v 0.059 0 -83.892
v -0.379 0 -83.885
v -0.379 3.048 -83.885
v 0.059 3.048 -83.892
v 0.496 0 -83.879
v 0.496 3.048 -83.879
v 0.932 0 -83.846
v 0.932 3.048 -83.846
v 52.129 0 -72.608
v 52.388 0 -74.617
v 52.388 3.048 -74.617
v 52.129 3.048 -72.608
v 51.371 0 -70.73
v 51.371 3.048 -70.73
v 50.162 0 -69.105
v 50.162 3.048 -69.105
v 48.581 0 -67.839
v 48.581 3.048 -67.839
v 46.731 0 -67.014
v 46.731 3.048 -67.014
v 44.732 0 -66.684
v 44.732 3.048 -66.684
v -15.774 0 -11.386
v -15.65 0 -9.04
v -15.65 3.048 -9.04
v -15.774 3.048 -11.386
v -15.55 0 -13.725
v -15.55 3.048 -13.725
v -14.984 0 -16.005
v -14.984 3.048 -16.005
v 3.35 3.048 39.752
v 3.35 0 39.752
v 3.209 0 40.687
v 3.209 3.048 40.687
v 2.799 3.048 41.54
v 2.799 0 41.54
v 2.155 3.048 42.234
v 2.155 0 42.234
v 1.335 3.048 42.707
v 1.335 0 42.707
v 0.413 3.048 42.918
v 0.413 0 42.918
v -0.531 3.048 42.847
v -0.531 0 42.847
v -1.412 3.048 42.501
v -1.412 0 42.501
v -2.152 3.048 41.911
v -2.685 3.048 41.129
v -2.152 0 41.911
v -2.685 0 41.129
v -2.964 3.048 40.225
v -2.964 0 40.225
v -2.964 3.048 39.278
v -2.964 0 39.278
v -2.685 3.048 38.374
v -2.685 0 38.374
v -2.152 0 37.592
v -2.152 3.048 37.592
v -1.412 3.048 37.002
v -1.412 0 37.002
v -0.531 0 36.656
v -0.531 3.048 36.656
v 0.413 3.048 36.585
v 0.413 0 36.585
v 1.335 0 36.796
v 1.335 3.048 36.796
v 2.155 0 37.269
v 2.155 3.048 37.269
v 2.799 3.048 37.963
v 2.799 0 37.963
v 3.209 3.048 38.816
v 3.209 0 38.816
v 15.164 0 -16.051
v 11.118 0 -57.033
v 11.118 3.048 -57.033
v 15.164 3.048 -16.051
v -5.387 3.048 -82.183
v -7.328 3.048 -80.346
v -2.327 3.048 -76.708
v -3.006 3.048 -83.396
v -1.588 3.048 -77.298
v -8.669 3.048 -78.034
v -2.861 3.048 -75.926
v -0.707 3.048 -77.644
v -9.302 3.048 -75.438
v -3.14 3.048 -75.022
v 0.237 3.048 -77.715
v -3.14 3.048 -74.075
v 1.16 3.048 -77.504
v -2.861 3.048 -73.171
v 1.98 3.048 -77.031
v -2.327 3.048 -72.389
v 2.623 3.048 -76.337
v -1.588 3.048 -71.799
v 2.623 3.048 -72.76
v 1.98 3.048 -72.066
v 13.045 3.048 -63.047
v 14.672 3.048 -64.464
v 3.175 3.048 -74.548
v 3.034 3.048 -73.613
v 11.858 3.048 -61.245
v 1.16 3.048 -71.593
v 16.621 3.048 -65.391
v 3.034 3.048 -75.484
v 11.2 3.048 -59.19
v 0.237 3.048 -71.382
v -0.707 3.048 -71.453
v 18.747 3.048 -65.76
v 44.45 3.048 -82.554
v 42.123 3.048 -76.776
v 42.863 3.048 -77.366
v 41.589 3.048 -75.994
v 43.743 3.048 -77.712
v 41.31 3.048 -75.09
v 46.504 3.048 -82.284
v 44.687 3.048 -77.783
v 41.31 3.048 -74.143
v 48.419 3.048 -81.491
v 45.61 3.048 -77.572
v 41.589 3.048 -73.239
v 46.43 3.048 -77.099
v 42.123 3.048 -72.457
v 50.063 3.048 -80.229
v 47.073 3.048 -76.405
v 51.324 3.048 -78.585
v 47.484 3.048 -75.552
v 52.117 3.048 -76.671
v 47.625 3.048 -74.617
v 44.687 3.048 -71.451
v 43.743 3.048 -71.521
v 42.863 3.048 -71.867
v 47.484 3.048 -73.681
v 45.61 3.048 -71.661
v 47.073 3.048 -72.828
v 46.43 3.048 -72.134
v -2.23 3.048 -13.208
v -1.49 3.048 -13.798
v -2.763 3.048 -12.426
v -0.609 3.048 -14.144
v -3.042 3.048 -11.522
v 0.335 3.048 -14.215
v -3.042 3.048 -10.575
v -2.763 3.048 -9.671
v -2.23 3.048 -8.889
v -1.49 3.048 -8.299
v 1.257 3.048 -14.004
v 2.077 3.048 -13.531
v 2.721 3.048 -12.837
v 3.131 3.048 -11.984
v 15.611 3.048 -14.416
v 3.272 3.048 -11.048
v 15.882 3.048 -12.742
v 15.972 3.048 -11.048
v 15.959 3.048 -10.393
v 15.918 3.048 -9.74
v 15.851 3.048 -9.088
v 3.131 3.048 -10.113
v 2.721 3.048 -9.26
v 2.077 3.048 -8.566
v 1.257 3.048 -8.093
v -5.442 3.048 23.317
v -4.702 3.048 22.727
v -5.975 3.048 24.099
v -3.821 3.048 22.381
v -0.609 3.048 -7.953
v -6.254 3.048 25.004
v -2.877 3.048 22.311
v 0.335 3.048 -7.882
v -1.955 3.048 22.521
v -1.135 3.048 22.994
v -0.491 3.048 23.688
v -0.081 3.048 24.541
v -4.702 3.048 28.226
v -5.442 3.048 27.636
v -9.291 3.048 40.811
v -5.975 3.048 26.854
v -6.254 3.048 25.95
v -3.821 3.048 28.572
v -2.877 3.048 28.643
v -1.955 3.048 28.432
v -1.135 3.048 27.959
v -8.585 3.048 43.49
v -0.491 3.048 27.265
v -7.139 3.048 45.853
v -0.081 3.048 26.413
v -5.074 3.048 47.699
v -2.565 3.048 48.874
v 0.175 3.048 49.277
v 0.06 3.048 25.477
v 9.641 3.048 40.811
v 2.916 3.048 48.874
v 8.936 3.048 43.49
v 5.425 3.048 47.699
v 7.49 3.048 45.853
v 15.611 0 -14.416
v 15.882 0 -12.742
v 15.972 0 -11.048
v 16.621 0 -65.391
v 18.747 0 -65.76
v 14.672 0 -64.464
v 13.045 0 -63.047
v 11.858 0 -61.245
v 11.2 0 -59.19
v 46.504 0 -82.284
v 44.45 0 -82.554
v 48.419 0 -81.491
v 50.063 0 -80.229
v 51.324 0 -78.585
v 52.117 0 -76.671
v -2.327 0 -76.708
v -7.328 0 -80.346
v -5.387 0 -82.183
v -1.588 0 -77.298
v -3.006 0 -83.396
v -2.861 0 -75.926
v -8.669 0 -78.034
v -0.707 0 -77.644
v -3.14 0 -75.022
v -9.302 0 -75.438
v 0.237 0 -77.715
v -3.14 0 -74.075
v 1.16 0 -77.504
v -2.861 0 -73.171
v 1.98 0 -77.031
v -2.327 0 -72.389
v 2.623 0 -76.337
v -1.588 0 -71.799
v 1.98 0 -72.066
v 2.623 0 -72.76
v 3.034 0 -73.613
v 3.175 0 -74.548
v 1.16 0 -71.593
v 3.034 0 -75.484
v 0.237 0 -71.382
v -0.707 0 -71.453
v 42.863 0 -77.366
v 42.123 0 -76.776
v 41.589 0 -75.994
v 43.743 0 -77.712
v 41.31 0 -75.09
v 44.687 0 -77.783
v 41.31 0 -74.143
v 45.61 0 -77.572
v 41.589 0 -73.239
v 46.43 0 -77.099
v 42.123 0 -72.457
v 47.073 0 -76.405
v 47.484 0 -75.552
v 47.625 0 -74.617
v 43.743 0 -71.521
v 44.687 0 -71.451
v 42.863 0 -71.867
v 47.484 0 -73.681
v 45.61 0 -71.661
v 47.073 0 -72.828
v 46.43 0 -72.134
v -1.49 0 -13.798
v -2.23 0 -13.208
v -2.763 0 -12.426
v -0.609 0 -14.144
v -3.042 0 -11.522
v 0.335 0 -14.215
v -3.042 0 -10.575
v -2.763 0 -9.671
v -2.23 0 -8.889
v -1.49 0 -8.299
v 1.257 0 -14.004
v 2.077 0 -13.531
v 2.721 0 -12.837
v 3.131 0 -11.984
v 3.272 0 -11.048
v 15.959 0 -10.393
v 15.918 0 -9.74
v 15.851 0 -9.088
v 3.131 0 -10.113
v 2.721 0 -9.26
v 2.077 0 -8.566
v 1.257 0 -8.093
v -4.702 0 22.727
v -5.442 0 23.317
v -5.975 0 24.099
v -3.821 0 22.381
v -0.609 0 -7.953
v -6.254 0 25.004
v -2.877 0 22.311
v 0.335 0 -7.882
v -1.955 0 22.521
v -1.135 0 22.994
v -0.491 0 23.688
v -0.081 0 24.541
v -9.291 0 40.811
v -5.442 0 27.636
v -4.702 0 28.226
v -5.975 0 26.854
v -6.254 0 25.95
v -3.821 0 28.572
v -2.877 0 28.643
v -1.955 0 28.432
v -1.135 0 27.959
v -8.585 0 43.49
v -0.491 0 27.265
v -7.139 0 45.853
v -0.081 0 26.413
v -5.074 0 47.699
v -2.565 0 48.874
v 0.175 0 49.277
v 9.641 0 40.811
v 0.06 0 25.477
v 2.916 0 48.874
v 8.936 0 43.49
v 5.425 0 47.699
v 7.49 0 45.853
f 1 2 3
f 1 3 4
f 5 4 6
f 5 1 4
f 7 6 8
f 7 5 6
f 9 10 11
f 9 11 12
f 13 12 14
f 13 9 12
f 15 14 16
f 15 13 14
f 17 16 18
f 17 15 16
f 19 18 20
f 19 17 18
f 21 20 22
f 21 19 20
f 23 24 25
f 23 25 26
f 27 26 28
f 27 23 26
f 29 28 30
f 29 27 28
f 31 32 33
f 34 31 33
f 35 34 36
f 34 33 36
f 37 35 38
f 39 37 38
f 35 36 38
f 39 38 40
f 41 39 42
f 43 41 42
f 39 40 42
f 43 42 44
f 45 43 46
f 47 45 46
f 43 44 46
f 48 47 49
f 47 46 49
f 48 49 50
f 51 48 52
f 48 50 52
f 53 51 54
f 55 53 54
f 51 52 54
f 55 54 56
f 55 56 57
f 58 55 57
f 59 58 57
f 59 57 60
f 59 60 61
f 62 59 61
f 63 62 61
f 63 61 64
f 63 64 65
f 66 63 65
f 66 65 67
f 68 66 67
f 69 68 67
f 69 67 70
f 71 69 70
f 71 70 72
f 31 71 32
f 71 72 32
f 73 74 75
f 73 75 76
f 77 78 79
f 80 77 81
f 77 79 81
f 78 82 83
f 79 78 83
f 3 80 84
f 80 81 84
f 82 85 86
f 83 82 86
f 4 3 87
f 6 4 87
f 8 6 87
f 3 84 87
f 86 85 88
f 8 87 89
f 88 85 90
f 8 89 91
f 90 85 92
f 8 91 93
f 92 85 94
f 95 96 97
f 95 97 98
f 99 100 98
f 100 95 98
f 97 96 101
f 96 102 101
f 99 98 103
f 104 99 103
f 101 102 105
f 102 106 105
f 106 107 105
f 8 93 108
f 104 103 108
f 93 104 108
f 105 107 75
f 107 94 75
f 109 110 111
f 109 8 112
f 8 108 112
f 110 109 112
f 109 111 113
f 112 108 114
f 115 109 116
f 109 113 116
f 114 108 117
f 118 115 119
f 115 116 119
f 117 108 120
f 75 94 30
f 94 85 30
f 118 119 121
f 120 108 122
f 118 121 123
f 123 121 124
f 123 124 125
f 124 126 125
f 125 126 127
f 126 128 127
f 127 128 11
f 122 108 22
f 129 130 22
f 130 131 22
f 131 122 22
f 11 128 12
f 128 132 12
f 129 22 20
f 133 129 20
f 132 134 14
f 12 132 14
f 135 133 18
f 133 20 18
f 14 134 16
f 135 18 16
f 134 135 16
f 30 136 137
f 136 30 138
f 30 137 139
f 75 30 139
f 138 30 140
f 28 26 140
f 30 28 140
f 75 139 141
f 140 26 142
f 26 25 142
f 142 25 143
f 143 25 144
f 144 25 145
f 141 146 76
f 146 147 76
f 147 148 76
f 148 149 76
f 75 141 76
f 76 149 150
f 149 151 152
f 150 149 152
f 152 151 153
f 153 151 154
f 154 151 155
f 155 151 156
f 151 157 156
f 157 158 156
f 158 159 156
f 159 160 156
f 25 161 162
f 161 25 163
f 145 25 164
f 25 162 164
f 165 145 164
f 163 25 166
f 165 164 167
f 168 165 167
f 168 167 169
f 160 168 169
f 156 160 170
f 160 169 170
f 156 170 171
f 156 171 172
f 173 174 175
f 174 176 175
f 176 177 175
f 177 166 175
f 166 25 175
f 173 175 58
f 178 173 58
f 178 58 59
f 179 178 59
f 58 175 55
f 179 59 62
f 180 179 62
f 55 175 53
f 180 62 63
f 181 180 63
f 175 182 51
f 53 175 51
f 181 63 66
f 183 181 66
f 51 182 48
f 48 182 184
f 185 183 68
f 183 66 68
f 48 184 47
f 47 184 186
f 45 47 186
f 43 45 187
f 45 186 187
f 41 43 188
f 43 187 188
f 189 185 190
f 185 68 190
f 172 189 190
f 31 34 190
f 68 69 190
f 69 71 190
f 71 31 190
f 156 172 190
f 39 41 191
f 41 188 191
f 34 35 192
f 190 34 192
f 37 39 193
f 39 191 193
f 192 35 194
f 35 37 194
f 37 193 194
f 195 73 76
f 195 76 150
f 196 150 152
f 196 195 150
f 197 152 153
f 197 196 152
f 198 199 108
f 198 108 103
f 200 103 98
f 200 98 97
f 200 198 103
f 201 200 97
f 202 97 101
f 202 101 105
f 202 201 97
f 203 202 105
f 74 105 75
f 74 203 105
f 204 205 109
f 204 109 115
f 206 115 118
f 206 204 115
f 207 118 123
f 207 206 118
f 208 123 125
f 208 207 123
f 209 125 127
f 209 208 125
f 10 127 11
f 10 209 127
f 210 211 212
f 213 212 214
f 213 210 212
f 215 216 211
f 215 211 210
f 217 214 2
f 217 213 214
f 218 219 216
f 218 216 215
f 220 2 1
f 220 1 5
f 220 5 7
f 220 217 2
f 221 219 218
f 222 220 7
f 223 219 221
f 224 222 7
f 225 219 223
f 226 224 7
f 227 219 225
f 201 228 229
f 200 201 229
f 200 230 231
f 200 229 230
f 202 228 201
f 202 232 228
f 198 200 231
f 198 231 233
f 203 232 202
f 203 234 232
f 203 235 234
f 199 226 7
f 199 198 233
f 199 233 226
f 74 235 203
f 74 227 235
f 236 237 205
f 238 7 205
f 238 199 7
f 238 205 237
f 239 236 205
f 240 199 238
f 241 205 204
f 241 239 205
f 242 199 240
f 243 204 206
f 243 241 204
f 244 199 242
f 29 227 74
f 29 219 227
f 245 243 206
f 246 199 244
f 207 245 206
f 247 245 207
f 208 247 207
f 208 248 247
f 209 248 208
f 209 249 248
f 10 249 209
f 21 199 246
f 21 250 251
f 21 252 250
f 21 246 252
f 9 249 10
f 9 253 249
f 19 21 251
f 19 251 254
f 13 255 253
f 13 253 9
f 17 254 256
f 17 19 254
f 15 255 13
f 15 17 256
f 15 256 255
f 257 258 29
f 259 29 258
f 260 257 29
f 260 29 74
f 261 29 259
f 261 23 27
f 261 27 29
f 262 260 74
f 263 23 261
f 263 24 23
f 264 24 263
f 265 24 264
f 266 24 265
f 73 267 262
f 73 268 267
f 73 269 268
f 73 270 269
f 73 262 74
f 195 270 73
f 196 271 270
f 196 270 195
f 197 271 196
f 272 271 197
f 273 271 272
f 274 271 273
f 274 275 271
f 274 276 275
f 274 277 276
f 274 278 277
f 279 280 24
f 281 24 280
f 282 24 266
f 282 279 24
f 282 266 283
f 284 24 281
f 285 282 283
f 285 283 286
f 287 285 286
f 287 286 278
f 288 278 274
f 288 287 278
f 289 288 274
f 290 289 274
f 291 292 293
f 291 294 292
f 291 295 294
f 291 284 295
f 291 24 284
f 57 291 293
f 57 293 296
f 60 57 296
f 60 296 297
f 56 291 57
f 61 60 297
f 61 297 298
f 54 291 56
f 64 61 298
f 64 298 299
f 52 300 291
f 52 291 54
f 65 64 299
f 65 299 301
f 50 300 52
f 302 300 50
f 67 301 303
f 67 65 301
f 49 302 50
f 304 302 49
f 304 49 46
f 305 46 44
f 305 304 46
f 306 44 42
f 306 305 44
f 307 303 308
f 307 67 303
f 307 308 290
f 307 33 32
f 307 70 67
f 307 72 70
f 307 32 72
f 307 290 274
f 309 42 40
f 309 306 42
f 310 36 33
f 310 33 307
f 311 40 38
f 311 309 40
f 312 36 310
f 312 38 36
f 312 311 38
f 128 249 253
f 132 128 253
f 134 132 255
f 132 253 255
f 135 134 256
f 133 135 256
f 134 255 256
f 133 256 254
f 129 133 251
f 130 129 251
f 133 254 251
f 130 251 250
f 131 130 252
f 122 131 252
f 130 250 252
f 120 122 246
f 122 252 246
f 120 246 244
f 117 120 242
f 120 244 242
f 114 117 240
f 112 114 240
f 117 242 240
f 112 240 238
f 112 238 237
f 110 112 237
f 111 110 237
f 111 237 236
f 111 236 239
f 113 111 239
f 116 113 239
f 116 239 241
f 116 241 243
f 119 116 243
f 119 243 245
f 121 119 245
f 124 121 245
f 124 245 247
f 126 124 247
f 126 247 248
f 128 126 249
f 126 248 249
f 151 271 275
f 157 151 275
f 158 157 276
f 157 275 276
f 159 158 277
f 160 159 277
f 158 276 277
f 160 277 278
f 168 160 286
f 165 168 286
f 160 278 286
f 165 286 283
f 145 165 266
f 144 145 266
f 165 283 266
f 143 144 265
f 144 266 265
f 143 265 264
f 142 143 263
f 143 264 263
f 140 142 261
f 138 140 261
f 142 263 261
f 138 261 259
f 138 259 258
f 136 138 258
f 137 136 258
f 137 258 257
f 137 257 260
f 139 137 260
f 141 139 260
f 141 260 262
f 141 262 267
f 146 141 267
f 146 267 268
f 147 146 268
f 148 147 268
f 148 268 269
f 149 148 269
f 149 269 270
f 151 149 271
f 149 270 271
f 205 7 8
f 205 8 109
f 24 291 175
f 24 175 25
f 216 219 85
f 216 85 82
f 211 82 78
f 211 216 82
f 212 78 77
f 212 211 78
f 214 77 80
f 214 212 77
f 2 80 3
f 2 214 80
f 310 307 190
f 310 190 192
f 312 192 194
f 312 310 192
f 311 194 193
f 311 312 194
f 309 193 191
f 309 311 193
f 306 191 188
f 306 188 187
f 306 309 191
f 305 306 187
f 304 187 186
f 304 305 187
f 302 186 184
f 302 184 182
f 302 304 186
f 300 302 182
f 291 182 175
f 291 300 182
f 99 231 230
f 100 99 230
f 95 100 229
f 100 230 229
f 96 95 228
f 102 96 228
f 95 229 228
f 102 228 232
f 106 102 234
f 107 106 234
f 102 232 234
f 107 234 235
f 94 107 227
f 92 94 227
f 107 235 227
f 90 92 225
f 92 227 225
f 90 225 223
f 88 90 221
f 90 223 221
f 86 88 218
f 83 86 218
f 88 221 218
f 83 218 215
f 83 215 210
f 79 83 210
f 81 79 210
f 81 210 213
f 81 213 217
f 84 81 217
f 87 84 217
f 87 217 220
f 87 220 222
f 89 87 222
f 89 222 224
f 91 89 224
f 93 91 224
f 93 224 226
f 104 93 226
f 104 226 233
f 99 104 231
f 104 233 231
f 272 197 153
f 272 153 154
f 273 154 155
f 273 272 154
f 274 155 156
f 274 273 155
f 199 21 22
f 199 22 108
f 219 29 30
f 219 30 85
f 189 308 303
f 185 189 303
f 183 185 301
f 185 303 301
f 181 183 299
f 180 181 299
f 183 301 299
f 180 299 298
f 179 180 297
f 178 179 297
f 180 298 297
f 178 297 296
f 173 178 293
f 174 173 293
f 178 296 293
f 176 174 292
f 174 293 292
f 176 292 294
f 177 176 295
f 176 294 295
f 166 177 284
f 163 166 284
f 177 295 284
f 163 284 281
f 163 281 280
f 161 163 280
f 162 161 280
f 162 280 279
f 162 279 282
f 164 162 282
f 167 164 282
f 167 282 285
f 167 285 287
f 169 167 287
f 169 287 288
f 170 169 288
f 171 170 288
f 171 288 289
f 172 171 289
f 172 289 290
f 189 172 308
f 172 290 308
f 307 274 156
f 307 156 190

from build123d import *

# Parameters (mm, degrees)
F0_R     = 3.175
F1_DEPTH = 3.048


with BuildPart() as f1:
    # F0 (on Front) → F1 (new body)
    with BuildSketch(Plane.XZ):
        with BuildLine():
            ThreePointArc((0.9317650018, -83.8459721666), (6.9288640955, -80.8176490707), (9.3440798747, -74.5484648293))
            ThreePointArc((9.3440798747, -74.5484648293), (-0.4451715738, -65.2149954328), (-9.3016620588, -75.4377969659))
            ThreePointArc((-9.3016620588, -75.4377969659), (-6.4238009338, -81.334230097), (-0.3786177199, -83.884870847))
            Line((-0.3786177199, -83.884870847), (0.9317650018, -83.8459721666))
        make_face()
        with Locations((0, -74.5484648293)):
            Circle(F0_R, mode=Mode.SUBTRACT)
        with BuildLine():
            ThreePointArc((-9.3016620588, -75.4377969659), (-0.4451715738, -65.2149954328), (9.3440798747, -74.5484648293))
            ThreePointArc((9.3440798747, -74.5484648293), (6.9288640955, -80.8176490707), (0.9317650018, -83.8459721666))
            Line((0.9317650018, -83.8459721666), (44.45, -82.554134379))
            ThreePointArc((44.45, -82.554134379), (36.5137551878, -74.4754800988), (44.7322639179, -66.6841547333))
            Line((44.7322639179, -66.6841547333), (18.7473772034, -65.7595263374))
            ThreePointArc((18.7473772034, -65.7595263374), (13.0448117515, -63.0471447529), (11.1183414278, -57.0334122443))
            Line((11.1183414278, -57.0334122443), (15.1635767889, -16.051013392))
            ThreePointArc((15.1635767889, -16.051013392), (0.0730961046, -26.9234462481), (-14.9840440257, -16.004887067))
            Line((-14.9840440257, -16.004887067), (-9.3016620588, -75.4377969659))
        make_face()
        with BuildLine():
            ThreePointArc((-0.3786177199, -83.884870847), (0.2772566603, -83.8884304315), (0.9317650018, -83.8459721666))
            Line((0.9317650018, -83.8459721666), (-0.3786177199, -83.884870847))
        make_face()
        with BuildLine():
            Line((-15.6499966361, -9.0395859455), (-14.9840440257, -16.004887067))
            ThreePointArc((-14.9840440257, -16.004887067), (0.0730961046, -26.9234462481), (15.1635767889, -16.051013392))
            Line((15.1635767889, -16.051013392), (15.8508702184, -9.0880233702))
            ThreePointArc((15.8508702184, -9.0880233702), (0.1217952948, 4.8265164035), (-15.6499966361, -9.0395859455))
        make_face()
        with Locations((0.0973850711, -11.0484648293)):
            Circle(F0_R, mode=Mode.SUBTRACT)
        with BuildLine():
            ThreePointArc((-15.6499966361, -9.0395859455), (-15.7055497457, -12.5593838131), (-14.9840440257, -16.004887067))
            Line((-14.9840440257, -16.004887067), (-15.6499966361, -9.0395859455))
        make_face()
        with BuildLine():
            ThreePointArc((44.7322639179, -66.6841547333), (36.5137551878, -74.4754800988), (44.45, -82.554134379))
            ThreePointArc((44.45, -82.554134379), (50.0626600757, -80.2292944547), (52.3875, -74.616634379))
            ThreePointArc((52.3875, -74.616634379), (50.1615836726, -69.1046730039), (44.7322639179, -66.6841547333))
        make_face()
        with Locations((44.45, -74.616634379)):
            Circle(F0_R, mode=Mode.SUBTRACT)
        with BuildLine():
            Line((-9.2905856273, 40.8111409425), (-15.6499966361, -9.0395859455))
            ThreePointArc((-15.6499966361, -9.0395859455), (0.1217952948, 4.8265164035), (15.8508702184, -9.0880233702))
            Line((15.8508702184, -9.0880233702), (9.6411718832, 40.8111409425))
            ThreePointArc((9.6411718832, 40.8111409425), (9.6855013313, 40.2821620908), (9.7002931279, 39.7515351707))
            ThreePointArc((9.7002931279, 39.7515351707), (-0.3553337921, 30.2413269673), (-9.2905856273, 40.8111409425))
        make_face()
        with Locations((-3.1145731919, 25.4767351707)):
            Circle(F0_R, mode=Mode.SUBTRACT)
        with BuildLine():
            Line((15.8508702184, -9.0880233702), (15.1635767889, -16.051013392))
            ThreePointArc((15.1635767889, -16.051013392), (15.7688785947, -13.5822200937), (15.9723850711, -11.0484648293))
            ThreePointArc((15.9723850711, -11.0484648293), (15.9419772355, -10.0663629285), (15.8508702184, -9.0880233702))
        make_face()
        with BuildLine():
            ThreePointArc((9.6411718832, 40.8111409425), (0.1752931279, 49.2765351707), (-9.2905856273, 40.8111409425))
            ThreePointArc((-9.2905856273, 40.8111409425), (-0.3553337921, 30.2413269673), (9.7002931279, 39.7515351707))
            ThreePointArc((9.7002931279, 39.7515351707), (9.6855013313, 40.2821620908), (9.6411718832, 40.8111409425))
        make_face()
        with Locations((0.1752931279, 39.7515351707)):
            Circle(F0_R, mode=Mode.SUBTRACT)
    extrude(amount=-F1_DEPTH)


solid = f1.part
